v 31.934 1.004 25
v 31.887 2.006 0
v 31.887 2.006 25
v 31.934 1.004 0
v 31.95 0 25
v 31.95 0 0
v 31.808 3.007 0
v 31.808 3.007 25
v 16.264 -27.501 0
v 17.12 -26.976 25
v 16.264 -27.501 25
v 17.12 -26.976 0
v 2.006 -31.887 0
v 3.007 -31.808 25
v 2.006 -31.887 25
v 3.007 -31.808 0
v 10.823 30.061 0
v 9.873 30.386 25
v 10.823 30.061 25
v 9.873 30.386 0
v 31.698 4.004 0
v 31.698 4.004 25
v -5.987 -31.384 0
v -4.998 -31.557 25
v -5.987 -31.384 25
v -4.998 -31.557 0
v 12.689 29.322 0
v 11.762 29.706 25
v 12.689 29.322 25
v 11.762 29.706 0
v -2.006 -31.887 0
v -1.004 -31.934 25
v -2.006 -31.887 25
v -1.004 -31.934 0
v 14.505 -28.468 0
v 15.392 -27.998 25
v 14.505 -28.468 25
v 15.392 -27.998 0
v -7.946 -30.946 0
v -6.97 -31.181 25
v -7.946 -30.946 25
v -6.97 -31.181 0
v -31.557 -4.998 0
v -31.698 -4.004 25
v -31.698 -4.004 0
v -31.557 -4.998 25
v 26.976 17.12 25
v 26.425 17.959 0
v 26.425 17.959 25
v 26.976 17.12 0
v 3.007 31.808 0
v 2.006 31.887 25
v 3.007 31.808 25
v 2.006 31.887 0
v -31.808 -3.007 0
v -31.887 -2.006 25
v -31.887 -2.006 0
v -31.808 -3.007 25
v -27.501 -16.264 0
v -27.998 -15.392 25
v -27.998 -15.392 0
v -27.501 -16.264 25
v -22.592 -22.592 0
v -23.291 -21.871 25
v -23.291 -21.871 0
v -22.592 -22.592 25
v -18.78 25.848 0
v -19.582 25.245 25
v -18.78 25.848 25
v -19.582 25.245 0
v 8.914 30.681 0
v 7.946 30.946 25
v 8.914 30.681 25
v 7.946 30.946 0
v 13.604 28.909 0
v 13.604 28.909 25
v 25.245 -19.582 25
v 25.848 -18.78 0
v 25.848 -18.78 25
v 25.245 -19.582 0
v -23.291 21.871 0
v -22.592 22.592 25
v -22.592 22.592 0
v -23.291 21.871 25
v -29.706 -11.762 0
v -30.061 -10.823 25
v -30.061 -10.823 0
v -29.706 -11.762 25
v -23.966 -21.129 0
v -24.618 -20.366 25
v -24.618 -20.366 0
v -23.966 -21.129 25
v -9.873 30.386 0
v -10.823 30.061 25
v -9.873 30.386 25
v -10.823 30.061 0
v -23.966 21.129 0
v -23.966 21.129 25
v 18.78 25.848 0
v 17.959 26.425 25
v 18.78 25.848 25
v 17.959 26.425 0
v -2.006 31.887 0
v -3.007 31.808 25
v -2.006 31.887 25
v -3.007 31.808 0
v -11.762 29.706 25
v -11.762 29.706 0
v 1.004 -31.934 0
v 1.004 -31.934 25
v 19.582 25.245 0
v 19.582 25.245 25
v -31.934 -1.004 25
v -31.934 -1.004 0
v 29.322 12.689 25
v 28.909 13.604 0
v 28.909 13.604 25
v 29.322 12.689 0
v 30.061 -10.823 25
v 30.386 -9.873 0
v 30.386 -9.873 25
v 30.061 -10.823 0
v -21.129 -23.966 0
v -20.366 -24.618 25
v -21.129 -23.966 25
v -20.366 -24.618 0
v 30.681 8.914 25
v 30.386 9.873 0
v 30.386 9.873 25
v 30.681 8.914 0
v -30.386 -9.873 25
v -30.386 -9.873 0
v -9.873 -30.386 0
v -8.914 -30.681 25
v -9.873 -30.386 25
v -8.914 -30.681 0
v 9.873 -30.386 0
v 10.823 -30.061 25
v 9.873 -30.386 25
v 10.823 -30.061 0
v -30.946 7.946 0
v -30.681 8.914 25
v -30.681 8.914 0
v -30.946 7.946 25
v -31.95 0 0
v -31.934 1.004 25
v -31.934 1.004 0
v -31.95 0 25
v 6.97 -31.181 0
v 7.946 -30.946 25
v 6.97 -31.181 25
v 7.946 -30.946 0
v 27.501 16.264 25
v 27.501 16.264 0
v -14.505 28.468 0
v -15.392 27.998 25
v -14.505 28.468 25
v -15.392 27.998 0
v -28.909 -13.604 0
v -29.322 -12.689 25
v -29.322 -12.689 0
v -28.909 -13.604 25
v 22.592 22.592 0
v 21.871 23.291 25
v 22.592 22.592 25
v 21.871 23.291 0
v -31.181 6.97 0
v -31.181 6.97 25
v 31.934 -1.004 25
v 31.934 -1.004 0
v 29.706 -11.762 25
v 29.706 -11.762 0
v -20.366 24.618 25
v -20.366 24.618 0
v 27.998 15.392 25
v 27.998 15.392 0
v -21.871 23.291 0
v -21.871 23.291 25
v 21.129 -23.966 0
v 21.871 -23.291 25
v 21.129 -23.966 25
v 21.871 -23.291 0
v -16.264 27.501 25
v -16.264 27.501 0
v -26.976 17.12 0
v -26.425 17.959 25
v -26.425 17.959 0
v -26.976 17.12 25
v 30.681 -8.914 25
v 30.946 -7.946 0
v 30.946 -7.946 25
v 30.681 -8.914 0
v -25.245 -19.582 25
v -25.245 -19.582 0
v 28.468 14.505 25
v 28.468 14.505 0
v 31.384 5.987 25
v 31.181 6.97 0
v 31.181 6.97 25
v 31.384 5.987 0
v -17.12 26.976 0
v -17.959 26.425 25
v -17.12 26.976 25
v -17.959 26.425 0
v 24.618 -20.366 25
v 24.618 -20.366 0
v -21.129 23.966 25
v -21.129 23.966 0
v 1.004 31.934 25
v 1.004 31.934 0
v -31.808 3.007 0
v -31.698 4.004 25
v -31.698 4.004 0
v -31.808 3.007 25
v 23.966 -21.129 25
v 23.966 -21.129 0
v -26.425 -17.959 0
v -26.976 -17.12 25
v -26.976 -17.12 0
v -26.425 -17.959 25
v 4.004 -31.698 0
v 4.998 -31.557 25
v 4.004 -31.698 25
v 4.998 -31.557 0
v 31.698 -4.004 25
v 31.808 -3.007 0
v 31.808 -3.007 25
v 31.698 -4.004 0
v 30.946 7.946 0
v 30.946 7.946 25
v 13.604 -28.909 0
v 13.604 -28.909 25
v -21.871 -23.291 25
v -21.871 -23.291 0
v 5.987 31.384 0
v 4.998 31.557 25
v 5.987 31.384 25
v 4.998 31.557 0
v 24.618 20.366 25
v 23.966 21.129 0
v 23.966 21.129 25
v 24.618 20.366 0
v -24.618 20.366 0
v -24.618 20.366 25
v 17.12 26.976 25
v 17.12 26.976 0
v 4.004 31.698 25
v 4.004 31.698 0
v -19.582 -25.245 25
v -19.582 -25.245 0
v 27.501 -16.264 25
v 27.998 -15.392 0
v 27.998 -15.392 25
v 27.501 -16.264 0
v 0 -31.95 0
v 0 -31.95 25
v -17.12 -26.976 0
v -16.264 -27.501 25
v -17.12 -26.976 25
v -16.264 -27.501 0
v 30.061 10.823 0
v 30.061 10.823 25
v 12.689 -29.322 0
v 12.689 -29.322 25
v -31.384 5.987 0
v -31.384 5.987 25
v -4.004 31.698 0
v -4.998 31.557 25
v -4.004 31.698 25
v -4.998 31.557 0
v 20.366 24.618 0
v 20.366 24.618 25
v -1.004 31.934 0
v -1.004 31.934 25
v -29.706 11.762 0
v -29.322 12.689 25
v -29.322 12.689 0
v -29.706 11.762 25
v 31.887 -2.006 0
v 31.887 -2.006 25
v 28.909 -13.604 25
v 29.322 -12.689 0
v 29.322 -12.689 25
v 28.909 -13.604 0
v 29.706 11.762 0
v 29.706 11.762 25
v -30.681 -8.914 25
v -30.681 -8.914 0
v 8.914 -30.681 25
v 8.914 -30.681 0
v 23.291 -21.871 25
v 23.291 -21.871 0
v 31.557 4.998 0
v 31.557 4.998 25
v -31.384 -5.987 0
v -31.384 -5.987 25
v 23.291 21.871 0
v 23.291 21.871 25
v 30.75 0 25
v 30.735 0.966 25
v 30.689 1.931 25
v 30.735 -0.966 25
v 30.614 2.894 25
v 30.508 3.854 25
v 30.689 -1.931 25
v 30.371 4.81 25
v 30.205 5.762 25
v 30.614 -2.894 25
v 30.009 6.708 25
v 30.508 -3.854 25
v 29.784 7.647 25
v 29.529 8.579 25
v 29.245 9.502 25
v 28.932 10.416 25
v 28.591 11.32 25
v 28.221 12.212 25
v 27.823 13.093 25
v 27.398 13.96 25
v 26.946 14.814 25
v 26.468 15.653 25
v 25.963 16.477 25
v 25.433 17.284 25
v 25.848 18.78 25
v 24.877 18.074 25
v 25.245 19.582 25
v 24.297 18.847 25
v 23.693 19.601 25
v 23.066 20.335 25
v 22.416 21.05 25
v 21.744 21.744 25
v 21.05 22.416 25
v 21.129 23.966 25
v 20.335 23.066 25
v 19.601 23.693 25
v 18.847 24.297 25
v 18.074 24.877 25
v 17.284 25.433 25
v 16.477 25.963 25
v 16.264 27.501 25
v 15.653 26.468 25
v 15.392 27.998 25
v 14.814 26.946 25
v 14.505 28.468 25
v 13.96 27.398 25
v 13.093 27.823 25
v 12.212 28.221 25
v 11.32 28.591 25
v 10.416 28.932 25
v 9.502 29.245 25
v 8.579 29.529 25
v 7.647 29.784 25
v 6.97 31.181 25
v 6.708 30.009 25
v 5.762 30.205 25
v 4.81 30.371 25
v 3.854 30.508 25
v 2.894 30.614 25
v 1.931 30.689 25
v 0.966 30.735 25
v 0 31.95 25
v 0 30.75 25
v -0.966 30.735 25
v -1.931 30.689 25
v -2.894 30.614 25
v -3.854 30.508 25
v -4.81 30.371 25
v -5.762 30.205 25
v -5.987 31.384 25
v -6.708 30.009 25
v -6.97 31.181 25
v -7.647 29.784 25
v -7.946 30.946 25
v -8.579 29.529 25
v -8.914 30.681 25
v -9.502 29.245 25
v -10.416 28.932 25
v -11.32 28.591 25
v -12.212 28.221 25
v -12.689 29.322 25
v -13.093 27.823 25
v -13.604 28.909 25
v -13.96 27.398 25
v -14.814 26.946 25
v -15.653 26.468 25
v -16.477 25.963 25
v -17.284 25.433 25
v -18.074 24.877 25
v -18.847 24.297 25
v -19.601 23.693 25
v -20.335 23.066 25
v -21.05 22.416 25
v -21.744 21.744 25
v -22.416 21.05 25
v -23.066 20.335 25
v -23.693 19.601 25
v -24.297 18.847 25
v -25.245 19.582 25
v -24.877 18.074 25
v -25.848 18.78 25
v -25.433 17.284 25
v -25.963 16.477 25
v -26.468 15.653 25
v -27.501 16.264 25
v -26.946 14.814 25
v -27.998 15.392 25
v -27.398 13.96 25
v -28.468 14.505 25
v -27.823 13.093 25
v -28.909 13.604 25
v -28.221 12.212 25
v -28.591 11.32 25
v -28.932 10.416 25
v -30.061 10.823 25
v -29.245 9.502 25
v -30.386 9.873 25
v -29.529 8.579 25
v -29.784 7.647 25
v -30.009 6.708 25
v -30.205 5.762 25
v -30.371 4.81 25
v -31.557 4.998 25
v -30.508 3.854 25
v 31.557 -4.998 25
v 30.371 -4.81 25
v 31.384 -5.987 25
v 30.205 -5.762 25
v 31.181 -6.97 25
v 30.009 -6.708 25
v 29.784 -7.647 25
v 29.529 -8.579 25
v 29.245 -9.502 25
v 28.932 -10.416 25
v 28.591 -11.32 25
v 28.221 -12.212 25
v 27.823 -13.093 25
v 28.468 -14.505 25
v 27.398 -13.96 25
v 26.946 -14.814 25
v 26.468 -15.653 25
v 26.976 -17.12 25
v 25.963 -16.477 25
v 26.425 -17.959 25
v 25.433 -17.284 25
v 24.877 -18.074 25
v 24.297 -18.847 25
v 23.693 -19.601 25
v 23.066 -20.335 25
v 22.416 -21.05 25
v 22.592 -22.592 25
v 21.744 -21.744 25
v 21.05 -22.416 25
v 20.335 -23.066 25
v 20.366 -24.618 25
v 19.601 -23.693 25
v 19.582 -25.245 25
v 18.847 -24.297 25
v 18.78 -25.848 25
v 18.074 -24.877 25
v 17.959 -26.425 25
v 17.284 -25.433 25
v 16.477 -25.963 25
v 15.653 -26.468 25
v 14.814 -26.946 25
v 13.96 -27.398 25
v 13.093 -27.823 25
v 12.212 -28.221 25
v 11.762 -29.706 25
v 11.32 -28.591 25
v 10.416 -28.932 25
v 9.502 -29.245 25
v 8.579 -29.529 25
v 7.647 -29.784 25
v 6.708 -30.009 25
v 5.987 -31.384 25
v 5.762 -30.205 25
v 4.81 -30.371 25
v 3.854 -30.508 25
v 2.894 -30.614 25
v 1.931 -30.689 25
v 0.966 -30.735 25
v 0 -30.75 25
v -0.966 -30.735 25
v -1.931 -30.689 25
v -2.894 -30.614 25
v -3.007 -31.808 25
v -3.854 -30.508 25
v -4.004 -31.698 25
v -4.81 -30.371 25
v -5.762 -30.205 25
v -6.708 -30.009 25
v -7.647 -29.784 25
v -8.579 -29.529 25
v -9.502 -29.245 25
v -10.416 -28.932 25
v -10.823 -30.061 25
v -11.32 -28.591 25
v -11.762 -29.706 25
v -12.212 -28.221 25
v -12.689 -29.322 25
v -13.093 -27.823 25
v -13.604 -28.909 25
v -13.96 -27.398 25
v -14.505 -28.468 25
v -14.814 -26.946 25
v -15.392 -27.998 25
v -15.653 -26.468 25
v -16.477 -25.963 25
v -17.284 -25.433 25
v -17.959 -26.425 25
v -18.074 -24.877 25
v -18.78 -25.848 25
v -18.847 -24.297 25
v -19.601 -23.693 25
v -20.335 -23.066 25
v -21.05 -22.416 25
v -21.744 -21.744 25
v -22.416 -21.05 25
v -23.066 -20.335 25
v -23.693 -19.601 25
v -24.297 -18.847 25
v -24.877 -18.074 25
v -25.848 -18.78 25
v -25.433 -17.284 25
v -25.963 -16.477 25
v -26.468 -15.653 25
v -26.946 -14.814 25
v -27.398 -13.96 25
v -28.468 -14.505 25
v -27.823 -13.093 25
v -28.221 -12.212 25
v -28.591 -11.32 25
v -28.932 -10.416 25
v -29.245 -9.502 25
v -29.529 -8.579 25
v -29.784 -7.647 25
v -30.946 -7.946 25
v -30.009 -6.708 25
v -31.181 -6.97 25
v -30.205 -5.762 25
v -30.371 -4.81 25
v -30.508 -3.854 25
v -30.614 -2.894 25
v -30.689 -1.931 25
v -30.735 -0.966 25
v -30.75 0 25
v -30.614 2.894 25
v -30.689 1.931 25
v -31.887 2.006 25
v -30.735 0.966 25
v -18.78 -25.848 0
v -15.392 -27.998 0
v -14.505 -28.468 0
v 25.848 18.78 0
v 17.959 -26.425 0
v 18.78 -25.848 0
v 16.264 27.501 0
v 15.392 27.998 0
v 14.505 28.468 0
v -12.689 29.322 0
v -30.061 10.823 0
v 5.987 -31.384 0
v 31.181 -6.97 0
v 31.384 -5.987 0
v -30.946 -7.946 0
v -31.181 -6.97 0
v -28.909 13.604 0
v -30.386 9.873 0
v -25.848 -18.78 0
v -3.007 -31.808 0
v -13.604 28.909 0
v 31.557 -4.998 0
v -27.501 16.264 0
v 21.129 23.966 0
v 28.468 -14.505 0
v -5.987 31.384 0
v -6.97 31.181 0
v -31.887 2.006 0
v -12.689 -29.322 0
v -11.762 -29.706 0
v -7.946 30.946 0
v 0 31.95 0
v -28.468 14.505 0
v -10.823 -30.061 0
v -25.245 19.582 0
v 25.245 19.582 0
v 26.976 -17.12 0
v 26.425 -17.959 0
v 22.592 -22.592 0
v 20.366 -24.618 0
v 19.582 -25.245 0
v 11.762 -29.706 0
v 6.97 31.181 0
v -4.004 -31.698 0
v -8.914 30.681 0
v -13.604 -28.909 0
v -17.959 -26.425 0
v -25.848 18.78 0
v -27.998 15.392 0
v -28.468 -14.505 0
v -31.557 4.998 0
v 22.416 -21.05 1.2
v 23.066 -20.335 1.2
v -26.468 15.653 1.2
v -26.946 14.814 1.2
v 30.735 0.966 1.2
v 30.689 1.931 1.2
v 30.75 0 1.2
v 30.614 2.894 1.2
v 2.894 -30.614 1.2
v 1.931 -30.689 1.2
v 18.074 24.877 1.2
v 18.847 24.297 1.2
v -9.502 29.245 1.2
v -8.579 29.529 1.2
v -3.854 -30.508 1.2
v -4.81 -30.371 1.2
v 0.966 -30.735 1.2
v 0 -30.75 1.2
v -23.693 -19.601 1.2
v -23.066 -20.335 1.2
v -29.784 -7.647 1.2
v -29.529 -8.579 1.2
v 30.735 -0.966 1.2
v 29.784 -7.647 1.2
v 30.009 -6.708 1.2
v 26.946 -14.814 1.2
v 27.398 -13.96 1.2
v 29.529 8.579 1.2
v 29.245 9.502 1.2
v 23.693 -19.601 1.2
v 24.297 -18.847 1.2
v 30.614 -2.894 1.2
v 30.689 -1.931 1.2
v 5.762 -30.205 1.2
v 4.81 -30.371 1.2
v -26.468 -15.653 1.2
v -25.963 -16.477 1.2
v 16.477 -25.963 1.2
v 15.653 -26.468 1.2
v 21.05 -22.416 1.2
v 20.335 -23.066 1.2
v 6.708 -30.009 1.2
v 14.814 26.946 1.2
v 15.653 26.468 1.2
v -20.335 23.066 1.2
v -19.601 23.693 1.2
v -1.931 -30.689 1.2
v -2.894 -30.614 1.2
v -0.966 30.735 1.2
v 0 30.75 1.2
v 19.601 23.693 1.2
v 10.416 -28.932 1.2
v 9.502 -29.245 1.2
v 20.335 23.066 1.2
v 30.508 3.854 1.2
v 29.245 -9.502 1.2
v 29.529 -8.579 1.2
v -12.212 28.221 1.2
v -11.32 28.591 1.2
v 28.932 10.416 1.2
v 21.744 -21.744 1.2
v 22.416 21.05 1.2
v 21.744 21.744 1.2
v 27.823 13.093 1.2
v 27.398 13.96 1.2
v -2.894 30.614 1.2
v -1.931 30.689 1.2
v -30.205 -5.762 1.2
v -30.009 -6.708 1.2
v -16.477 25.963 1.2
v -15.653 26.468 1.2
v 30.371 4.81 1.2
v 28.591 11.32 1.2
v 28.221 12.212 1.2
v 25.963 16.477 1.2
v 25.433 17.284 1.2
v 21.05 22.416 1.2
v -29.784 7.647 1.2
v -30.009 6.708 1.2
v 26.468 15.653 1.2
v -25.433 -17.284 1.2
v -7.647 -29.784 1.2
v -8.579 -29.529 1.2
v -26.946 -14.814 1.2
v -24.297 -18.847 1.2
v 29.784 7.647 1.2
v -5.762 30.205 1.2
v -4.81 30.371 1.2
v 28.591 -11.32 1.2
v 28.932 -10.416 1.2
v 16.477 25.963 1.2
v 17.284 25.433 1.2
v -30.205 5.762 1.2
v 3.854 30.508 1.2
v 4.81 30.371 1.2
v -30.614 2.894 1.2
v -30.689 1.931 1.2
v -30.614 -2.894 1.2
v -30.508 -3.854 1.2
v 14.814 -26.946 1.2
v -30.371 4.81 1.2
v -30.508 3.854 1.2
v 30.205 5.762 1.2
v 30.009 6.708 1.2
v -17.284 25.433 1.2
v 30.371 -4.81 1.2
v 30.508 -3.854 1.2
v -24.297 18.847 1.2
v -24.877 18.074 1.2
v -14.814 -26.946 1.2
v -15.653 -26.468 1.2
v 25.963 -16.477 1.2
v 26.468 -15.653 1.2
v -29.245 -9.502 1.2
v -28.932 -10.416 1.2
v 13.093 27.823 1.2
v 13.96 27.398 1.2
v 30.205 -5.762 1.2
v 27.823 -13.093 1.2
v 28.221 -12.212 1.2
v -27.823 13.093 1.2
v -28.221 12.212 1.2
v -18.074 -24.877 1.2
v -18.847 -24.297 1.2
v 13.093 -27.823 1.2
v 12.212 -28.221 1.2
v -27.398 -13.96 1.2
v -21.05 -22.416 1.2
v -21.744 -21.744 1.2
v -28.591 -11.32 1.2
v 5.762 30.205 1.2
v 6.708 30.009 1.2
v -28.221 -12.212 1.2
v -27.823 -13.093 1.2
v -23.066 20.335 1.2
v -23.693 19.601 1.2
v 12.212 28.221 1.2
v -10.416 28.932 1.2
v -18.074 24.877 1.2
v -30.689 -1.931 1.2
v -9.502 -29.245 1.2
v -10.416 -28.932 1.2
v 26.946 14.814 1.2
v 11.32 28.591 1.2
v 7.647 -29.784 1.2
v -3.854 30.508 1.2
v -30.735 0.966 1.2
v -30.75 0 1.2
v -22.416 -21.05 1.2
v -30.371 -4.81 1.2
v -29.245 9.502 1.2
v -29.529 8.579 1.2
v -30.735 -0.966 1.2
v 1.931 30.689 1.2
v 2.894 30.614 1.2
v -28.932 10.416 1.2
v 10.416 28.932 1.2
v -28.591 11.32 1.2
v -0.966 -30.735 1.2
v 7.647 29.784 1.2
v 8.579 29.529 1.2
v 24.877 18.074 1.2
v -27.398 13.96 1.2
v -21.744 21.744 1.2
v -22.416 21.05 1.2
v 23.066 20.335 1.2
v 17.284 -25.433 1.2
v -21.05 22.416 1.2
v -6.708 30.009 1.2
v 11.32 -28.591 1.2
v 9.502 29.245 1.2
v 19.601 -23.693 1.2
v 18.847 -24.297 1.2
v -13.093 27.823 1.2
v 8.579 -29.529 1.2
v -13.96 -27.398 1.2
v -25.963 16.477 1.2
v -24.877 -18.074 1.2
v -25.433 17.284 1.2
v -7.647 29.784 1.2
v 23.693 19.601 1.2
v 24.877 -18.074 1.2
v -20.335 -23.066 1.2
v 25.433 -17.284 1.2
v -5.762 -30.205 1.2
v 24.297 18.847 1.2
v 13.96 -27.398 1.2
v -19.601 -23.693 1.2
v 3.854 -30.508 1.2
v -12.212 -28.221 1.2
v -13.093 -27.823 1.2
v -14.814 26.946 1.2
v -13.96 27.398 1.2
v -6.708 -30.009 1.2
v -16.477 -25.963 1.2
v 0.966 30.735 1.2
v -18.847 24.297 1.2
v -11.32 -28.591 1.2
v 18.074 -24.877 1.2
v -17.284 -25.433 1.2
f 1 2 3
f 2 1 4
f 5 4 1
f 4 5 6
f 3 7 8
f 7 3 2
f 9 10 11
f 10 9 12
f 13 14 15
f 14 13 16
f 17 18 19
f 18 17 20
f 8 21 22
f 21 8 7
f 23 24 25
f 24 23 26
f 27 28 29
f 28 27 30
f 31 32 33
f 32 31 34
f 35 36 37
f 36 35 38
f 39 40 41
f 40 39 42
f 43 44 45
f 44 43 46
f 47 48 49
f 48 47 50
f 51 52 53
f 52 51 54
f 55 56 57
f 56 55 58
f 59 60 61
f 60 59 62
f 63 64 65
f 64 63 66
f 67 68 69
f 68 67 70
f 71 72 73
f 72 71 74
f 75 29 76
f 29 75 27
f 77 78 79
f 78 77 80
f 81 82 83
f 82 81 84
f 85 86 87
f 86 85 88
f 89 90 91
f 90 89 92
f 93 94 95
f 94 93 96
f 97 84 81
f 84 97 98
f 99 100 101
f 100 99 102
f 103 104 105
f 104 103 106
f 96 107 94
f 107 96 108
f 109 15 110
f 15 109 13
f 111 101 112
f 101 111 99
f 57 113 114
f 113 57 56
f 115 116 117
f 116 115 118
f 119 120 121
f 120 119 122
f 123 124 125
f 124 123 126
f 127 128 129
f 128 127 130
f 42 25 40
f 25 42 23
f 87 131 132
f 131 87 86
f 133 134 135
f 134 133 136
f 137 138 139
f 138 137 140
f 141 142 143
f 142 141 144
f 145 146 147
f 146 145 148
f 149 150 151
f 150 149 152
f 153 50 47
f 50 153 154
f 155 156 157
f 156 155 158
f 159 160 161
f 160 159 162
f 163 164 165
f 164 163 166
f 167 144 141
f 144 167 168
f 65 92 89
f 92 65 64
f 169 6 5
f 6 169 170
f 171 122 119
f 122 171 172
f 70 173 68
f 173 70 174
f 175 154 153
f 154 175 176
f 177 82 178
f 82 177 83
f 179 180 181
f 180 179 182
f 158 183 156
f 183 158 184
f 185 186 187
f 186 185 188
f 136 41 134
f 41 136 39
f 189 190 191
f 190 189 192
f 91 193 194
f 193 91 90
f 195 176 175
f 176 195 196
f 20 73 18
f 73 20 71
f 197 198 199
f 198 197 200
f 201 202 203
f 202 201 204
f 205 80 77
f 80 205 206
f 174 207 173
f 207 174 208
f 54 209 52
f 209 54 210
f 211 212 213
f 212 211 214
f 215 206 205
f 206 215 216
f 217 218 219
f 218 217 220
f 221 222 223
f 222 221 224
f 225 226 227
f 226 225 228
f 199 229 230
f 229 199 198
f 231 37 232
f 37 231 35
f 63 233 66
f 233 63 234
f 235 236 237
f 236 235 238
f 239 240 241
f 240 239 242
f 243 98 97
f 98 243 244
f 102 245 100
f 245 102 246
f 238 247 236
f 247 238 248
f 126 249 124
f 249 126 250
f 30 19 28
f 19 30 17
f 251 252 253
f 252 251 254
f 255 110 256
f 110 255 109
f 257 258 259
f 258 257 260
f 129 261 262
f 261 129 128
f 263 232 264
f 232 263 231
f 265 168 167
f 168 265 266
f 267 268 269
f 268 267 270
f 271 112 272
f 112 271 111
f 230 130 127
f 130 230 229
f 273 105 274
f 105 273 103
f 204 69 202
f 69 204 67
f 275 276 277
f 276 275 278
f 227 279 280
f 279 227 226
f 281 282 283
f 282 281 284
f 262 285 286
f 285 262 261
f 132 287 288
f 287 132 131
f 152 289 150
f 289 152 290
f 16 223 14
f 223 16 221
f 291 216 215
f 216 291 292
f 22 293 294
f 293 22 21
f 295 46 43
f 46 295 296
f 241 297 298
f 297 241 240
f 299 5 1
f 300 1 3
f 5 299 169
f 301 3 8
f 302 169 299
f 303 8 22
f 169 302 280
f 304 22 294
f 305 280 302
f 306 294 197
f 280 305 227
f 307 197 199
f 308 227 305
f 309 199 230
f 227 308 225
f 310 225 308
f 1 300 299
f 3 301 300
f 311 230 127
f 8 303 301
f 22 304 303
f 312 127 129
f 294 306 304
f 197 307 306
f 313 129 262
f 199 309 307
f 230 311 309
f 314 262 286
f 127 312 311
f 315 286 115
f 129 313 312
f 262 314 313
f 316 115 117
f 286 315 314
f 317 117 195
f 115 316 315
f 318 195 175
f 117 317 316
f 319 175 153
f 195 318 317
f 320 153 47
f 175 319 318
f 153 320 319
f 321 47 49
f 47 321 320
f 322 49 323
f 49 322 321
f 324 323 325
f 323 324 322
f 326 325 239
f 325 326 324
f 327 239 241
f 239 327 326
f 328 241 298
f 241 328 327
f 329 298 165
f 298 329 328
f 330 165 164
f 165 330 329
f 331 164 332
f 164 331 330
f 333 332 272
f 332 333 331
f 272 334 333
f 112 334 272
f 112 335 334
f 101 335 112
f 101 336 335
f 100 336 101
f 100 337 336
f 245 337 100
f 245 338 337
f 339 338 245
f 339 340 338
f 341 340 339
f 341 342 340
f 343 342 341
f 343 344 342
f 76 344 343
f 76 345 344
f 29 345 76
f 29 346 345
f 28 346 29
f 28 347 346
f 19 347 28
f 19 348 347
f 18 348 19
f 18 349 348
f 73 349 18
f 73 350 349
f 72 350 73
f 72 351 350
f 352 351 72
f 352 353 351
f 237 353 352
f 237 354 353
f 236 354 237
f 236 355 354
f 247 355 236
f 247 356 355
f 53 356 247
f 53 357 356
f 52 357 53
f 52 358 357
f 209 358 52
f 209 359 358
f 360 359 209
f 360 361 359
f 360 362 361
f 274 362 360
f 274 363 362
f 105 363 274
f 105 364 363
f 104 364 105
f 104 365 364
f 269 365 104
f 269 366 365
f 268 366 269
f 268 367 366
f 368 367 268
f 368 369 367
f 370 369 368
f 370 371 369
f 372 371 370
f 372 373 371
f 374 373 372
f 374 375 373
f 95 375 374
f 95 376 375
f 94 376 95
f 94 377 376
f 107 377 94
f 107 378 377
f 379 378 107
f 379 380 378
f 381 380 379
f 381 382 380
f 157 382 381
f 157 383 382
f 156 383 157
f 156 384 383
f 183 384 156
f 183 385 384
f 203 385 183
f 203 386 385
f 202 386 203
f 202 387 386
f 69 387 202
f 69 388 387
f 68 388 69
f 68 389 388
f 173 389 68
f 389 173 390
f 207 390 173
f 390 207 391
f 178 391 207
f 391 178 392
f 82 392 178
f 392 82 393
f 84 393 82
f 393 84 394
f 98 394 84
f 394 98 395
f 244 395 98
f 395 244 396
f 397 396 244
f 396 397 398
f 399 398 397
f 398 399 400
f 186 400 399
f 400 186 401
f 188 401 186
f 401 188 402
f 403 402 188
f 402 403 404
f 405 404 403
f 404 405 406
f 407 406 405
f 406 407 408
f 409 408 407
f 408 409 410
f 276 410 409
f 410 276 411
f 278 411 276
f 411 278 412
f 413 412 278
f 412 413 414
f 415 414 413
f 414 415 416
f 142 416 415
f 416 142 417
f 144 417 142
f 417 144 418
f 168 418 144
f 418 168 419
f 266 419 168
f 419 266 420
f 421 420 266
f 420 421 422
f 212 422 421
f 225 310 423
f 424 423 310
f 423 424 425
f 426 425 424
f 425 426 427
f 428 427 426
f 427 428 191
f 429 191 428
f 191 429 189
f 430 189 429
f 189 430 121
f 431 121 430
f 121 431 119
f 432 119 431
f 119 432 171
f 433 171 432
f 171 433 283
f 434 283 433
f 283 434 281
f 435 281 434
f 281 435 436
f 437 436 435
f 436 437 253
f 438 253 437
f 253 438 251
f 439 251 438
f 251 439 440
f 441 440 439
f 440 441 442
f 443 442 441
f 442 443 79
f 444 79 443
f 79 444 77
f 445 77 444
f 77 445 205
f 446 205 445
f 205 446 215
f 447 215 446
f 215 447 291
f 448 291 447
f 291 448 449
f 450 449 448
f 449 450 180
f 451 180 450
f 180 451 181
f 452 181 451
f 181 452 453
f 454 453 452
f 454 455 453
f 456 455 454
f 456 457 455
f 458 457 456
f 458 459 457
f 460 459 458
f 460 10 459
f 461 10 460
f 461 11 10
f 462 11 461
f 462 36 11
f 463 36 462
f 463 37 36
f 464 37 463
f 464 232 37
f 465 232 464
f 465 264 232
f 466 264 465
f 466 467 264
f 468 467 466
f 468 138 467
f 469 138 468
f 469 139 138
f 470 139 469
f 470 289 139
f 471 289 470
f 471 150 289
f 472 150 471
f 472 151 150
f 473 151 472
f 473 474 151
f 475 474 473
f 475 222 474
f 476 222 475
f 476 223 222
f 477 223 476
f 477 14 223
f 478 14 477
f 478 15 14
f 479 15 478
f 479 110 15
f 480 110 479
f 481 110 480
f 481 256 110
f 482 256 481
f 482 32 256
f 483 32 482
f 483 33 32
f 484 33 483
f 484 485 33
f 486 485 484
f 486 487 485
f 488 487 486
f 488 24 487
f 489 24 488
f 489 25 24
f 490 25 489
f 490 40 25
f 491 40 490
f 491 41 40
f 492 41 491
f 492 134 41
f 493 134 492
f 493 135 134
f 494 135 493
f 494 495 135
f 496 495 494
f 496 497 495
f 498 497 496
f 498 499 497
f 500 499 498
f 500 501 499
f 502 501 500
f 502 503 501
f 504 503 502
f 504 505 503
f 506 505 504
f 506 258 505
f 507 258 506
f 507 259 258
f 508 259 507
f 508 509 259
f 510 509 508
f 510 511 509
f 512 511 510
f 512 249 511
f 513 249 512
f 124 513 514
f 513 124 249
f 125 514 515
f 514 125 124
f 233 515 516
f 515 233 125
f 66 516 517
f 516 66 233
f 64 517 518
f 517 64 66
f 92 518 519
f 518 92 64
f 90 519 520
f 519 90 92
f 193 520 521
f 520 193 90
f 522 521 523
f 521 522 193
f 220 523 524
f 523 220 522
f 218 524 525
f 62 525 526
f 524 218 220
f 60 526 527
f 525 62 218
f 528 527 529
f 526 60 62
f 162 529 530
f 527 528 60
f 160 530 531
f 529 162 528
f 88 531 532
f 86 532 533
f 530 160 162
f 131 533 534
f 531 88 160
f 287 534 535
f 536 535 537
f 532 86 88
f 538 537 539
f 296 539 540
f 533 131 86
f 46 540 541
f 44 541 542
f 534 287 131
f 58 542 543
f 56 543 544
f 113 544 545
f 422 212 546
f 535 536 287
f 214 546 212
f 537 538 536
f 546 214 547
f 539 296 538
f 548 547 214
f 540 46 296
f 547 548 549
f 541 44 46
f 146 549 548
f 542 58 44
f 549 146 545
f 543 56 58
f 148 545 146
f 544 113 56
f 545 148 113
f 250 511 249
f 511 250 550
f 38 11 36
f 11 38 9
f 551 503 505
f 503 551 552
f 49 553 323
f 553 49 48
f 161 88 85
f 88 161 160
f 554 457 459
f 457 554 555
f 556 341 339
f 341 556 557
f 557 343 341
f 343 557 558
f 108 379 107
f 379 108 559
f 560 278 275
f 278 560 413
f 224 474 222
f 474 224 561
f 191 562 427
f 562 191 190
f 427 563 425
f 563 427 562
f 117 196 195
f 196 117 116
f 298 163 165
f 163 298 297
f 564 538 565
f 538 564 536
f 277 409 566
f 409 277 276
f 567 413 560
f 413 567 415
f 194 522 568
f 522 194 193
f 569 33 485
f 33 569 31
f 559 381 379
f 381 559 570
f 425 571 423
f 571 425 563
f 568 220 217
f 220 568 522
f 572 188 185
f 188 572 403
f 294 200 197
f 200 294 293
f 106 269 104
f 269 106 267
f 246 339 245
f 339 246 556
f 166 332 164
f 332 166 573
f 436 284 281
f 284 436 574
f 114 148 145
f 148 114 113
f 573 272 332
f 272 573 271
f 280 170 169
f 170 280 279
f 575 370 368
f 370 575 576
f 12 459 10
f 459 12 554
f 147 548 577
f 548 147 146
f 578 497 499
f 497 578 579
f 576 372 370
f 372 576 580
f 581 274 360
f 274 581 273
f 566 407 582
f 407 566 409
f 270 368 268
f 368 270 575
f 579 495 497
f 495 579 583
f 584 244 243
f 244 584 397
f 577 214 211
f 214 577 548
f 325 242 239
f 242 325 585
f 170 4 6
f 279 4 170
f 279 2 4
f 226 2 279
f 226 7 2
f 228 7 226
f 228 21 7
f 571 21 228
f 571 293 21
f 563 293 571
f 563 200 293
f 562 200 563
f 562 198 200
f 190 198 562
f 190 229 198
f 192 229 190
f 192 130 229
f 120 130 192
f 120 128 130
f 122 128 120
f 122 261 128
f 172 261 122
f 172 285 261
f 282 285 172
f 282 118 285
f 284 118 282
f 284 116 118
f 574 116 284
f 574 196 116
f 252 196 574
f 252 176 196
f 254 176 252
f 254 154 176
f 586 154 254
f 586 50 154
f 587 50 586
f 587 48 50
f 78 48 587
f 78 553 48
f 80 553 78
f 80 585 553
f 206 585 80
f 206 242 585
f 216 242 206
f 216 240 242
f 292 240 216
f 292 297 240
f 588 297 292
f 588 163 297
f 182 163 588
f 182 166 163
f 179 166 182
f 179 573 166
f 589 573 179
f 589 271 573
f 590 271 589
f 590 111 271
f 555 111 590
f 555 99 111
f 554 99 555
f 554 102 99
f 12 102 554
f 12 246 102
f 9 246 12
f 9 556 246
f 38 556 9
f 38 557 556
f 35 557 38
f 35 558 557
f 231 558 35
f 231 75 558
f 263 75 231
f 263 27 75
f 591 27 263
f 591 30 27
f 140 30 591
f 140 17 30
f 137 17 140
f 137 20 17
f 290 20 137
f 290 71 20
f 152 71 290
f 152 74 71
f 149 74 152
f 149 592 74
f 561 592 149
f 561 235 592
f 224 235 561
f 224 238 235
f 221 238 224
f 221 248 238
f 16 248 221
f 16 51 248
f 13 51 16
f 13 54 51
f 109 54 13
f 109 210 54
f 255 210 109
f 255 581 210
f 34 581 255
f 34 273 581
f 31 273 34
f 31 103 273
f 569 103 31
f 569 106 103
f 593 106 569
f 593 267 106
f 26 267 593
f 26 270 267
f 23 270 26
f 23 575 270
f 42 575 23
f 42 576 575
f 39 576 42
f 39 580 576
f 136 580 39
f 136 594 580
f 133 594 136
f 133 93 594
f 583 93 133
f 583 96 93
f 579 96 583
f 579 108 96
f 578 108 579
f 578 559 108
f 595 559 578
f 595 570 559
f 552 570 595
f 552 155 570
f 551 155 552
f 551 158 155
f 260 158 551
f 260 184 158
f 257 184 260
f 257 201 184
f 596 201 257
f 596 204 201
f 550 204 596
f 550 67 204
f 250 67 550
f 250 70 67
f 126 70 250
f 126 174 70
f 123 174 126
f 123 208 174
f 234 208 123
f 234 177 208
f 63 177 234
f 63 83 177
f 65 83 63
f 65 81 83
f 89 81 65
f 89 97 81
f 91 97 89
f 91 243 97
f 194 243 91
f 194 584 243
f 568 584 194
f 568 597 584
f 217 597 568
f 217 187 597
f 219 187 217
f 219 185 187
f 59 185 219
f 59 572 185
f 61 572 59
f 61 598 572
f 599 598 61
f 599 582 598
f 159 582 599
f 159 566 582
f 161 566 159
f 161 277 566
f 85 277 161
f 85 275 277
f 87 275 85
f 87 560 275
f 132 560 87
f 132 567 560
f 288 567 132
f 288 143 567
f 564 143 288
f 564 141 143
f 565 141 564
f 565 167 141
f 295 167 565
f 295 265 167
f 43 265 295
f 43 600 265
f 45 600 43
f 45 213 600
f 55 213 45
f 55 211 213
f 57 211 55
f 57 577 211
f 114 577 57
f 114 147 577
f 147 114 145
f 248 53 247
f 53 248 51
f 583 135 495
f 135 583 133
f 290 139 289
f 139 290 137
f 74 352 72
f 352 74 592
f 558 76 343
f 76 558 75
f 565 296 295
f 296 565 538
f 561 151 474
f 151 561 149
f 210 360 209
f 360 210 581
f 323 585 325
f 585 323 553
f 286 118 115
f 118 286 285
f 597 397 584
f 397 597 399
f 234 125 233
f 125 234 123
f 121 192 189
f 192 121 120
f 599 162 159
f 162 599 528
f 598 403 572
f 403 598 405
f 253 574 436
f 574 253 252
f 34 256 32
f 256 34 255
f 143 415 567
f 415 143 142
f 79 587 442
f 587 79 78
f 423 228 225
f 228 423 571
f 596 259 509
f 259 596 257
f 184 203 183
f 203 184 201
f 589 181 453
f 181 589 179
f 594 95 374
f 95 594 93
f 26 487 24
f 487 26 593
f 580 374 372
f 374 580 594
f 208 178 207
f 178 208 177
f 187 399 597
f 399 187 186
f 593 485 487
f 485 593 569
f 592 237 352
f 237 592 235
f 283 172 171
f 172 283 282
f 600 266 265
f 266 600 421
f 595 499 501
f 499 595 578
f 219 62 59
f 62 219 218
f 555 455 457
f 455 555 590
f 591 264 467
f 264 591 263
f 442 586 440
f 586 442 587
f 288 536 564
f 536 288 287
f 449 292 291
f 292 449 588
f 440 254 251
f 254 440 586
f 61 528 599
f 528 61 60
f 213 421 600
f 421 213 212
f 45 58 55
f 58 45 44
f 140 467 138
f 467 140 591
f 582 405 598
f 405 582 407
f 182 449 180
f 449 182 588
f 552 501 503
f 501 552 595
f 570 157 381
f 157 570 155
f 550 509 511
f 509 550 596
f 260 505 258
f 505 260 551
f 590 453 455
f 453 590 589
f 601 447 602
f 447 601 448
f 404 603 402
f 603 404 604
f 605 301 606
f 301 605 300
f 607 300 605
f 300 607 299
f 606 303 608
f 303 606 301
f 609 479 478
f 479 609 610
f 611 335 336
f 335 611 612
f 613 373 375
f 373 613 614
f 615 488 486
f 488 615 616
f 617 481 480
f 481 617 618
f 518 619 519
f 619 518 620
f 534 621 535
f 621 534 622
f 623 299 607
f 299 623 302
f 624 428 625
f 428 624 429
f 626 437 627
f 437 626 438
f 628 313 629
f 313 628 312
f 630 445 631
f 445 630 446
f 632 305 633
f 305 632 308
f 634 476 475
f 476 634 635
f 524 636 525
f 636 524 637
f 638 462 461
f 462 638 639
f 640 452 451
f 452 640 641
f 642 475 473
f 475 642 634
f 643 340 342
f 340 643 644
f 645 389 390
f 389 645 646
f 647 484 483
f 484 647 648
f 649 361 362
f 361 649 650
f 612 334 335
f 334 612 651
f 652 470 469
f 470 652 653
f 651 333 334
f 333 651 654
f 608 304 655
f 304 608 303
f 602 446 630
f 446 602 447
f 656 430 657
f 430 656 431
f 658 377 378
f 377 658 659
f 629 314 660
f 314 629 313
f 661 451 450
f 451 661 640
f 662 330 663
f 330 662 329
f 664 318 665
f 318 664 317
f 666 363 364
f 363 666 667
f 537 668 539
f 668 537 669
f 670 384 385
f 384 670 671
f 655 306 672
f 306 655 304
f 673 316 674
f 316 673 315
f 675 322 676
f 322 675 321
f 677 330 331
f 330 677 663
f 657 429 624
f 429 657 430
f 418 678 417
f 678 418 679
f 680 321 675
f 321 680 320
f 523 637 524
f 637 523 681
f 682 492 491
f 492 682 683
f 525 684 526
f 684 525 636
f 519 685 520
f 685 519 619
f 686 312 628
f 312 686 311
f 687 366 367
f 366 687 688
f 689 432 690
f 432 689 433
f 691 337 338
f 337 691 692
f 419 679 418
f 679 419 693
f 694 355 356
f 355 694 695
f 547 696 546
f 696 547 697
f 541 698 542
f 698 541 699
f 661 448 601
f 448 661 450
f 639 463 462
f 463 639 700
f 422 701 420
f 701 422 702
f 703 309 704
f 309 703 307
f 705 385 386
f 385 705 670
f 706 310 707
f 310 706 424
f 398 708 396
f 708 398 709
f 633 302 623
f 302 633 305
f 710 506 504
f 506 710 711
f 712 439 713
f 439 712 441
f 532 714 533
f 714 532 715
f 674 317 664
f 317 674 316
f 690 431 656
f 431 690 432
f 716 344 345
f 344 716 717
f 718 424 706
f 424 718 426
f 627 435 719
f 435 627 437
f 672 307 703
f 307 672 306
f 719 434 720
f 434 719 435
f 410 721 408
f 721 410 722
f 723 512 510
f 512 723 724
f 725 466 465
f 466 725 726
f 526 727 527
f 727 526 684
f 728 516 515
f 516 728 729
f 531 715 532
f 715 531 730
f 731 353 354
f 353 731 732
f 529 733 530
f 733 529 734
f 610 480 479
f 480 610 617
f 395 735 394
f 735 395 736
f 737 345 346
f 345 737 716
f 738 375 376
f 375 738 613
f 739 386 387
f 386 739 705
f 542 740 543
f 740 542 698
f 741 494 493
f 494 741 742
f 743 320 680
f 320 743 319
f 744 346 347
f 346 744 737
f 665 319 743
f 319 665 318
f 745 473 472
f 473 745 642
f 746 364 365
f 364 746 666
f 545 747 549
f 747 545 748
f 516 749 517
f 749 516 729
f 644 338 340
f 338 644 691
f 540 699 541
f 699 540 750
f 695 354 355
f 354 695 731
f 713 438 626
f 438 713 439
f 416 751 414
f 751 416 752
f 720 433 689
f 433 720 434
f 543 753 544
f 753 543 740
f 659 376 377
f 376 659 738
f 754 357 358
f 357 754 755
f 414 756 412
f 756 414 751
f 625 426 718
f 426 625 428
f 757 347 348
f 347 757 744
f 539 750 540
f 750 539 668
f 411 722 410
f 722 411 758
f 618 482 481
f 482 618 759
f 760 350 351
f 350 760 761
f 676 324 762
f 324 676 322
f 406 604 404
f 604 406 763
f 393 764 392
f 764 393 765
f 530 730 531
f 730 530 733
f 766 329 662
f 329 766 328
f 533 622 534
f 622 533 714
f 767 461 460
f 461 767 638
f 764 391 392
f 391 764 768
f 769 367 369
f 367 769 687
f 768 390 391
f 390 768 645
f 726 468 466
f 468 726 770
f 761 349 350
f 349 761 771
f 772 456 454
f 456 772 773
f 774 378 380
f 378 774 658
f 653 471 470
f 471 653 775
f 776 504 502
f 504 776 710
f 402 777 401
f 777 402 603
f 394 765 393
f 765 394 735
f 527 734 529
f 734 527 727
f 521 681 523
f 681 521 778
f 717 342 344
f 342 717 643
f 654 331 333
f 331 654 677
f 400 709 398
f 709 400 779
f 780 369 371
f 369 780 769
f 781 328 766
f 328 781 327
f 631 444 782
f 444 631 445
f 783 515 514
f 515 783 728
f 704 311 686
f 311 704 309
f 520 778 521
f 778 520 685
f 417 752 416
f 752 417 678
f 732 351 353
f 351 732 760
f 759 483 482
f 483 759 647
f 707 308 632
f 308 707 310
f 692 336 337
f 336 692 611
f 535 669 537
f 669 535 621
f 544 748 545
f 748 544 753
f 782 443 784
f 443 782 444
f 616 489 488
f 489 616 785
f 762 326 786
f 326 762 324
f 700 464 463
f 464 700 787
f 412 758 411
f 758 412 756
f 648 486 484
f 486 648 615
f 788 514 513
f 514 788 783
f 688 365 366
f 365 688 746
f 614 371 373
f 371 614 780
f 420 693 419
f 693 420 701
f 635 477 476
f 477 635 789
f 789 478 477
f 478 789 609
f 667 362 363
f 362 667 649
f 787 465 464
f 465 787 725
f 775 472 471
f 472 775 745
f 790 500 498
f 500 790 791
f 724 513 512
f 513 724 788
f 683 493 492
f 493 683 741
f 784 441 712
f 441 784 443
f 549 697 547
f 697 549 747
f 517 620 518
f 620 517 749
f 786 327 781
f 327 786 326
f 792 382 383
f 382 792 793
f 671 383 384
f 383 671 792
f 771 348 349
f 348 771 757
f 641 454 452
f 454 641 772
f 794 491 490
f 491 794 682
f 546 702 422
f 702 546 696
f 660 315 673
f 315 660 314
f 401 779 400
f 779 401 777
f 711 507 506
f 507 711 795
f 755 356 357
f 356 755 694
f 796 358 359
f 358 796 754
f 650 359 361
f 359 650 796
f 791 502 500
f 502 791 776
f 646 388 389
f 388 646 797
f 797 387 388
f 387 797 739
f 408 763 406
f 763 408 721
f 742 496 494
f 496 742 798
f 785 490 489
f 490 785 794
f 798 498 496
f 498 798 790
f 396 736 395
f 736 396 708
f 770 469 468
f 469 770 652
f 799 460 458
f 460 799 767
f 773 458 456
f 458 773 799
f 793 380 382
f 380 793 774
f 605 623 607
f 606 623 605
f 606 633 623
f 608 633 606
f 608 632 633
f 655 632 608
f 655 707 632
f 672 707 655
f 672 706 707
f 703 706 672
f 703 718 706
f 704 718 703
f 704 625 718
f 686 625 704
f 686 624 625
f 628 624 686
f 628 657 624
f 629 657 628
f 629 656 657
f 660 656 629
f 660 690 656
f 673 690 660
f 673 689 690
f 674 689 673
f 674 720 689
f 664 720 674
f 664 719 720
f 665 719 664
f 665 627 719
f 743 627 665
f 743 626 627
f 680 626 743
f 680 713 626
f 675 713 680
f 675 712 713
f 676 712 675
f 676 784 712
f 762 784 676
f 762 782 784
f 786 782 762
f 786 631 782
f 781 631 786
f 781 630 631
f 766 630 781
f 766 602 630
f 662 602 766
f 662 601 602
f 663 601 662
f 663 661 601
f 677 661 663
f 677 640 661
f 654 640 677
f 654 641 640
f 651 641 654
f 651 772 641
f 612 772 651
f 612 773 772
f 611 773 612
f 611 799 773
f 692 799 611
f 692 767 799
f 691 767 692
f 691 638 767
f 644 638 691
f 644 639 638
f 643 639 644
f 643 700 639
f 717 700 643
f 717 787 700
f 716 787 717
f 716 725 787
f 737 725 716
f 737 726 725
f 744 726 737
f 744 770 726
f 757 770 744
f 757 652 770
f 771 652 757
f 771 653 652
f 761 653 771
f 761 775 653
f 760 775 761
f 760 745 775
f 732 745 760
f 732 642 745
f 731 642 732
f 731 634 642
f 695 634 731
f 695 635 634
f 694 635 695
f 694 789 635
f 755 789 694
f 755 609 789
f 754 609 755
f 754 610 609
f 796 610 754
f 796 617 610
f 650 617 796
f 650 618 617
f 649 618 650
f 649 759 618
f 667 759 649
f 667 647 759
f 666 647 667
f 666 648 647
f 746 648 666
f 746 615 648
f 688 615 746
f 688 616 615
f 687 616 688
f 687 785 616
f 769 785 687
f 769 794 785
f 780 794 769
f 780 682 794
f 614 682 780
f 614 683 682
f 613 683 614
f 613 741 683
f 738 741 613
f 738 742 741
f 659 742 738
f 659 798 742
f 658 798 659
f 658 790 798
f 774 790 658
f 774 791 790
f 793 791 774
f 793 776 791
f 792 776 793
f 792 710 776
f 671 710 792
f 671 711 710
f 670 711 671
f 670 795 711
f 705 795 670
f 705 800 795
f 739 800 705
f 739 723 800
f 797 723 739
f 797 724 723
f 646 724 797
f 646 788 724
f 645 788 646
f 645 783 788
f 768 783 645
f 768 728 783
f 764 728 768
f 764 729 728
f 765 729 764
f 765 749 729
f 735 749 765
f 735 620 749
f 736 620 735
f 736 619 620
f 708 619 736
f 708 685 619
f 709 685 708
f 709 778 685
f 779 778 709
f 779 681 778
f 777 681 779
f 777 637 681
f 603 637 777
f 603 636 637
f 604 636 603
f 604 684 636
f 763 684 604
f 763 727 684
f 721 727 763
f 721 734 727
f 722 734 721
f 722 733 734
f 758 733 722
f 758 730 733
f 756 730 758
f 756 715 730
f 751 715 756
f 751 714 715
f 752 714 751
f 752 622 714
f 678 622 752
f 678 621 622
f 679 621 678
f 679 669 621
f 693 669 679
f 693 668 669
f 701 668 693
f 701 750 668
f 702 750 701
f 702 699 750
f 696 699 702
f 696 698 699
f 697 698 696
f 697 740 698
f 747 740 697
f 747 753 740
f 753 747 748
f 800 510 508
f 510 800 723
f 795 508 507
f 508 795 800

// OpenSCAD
// Fitting Cap
 
$fn = 200;
 
// Parameters
inner_radius = 30.75;
wall_thickness = 1.2;
outer_radius = inner_radius + wall_thickness;
height = 25;
 
difference() {
    // This piece will be created:
    cylinder(r=outer_radius, h=height, center=false);
 
    // Everything else listed will be taken away:
    translate([0,0,1.2])cylinder(r=inner_radius, h=height, center=false);
}


    
